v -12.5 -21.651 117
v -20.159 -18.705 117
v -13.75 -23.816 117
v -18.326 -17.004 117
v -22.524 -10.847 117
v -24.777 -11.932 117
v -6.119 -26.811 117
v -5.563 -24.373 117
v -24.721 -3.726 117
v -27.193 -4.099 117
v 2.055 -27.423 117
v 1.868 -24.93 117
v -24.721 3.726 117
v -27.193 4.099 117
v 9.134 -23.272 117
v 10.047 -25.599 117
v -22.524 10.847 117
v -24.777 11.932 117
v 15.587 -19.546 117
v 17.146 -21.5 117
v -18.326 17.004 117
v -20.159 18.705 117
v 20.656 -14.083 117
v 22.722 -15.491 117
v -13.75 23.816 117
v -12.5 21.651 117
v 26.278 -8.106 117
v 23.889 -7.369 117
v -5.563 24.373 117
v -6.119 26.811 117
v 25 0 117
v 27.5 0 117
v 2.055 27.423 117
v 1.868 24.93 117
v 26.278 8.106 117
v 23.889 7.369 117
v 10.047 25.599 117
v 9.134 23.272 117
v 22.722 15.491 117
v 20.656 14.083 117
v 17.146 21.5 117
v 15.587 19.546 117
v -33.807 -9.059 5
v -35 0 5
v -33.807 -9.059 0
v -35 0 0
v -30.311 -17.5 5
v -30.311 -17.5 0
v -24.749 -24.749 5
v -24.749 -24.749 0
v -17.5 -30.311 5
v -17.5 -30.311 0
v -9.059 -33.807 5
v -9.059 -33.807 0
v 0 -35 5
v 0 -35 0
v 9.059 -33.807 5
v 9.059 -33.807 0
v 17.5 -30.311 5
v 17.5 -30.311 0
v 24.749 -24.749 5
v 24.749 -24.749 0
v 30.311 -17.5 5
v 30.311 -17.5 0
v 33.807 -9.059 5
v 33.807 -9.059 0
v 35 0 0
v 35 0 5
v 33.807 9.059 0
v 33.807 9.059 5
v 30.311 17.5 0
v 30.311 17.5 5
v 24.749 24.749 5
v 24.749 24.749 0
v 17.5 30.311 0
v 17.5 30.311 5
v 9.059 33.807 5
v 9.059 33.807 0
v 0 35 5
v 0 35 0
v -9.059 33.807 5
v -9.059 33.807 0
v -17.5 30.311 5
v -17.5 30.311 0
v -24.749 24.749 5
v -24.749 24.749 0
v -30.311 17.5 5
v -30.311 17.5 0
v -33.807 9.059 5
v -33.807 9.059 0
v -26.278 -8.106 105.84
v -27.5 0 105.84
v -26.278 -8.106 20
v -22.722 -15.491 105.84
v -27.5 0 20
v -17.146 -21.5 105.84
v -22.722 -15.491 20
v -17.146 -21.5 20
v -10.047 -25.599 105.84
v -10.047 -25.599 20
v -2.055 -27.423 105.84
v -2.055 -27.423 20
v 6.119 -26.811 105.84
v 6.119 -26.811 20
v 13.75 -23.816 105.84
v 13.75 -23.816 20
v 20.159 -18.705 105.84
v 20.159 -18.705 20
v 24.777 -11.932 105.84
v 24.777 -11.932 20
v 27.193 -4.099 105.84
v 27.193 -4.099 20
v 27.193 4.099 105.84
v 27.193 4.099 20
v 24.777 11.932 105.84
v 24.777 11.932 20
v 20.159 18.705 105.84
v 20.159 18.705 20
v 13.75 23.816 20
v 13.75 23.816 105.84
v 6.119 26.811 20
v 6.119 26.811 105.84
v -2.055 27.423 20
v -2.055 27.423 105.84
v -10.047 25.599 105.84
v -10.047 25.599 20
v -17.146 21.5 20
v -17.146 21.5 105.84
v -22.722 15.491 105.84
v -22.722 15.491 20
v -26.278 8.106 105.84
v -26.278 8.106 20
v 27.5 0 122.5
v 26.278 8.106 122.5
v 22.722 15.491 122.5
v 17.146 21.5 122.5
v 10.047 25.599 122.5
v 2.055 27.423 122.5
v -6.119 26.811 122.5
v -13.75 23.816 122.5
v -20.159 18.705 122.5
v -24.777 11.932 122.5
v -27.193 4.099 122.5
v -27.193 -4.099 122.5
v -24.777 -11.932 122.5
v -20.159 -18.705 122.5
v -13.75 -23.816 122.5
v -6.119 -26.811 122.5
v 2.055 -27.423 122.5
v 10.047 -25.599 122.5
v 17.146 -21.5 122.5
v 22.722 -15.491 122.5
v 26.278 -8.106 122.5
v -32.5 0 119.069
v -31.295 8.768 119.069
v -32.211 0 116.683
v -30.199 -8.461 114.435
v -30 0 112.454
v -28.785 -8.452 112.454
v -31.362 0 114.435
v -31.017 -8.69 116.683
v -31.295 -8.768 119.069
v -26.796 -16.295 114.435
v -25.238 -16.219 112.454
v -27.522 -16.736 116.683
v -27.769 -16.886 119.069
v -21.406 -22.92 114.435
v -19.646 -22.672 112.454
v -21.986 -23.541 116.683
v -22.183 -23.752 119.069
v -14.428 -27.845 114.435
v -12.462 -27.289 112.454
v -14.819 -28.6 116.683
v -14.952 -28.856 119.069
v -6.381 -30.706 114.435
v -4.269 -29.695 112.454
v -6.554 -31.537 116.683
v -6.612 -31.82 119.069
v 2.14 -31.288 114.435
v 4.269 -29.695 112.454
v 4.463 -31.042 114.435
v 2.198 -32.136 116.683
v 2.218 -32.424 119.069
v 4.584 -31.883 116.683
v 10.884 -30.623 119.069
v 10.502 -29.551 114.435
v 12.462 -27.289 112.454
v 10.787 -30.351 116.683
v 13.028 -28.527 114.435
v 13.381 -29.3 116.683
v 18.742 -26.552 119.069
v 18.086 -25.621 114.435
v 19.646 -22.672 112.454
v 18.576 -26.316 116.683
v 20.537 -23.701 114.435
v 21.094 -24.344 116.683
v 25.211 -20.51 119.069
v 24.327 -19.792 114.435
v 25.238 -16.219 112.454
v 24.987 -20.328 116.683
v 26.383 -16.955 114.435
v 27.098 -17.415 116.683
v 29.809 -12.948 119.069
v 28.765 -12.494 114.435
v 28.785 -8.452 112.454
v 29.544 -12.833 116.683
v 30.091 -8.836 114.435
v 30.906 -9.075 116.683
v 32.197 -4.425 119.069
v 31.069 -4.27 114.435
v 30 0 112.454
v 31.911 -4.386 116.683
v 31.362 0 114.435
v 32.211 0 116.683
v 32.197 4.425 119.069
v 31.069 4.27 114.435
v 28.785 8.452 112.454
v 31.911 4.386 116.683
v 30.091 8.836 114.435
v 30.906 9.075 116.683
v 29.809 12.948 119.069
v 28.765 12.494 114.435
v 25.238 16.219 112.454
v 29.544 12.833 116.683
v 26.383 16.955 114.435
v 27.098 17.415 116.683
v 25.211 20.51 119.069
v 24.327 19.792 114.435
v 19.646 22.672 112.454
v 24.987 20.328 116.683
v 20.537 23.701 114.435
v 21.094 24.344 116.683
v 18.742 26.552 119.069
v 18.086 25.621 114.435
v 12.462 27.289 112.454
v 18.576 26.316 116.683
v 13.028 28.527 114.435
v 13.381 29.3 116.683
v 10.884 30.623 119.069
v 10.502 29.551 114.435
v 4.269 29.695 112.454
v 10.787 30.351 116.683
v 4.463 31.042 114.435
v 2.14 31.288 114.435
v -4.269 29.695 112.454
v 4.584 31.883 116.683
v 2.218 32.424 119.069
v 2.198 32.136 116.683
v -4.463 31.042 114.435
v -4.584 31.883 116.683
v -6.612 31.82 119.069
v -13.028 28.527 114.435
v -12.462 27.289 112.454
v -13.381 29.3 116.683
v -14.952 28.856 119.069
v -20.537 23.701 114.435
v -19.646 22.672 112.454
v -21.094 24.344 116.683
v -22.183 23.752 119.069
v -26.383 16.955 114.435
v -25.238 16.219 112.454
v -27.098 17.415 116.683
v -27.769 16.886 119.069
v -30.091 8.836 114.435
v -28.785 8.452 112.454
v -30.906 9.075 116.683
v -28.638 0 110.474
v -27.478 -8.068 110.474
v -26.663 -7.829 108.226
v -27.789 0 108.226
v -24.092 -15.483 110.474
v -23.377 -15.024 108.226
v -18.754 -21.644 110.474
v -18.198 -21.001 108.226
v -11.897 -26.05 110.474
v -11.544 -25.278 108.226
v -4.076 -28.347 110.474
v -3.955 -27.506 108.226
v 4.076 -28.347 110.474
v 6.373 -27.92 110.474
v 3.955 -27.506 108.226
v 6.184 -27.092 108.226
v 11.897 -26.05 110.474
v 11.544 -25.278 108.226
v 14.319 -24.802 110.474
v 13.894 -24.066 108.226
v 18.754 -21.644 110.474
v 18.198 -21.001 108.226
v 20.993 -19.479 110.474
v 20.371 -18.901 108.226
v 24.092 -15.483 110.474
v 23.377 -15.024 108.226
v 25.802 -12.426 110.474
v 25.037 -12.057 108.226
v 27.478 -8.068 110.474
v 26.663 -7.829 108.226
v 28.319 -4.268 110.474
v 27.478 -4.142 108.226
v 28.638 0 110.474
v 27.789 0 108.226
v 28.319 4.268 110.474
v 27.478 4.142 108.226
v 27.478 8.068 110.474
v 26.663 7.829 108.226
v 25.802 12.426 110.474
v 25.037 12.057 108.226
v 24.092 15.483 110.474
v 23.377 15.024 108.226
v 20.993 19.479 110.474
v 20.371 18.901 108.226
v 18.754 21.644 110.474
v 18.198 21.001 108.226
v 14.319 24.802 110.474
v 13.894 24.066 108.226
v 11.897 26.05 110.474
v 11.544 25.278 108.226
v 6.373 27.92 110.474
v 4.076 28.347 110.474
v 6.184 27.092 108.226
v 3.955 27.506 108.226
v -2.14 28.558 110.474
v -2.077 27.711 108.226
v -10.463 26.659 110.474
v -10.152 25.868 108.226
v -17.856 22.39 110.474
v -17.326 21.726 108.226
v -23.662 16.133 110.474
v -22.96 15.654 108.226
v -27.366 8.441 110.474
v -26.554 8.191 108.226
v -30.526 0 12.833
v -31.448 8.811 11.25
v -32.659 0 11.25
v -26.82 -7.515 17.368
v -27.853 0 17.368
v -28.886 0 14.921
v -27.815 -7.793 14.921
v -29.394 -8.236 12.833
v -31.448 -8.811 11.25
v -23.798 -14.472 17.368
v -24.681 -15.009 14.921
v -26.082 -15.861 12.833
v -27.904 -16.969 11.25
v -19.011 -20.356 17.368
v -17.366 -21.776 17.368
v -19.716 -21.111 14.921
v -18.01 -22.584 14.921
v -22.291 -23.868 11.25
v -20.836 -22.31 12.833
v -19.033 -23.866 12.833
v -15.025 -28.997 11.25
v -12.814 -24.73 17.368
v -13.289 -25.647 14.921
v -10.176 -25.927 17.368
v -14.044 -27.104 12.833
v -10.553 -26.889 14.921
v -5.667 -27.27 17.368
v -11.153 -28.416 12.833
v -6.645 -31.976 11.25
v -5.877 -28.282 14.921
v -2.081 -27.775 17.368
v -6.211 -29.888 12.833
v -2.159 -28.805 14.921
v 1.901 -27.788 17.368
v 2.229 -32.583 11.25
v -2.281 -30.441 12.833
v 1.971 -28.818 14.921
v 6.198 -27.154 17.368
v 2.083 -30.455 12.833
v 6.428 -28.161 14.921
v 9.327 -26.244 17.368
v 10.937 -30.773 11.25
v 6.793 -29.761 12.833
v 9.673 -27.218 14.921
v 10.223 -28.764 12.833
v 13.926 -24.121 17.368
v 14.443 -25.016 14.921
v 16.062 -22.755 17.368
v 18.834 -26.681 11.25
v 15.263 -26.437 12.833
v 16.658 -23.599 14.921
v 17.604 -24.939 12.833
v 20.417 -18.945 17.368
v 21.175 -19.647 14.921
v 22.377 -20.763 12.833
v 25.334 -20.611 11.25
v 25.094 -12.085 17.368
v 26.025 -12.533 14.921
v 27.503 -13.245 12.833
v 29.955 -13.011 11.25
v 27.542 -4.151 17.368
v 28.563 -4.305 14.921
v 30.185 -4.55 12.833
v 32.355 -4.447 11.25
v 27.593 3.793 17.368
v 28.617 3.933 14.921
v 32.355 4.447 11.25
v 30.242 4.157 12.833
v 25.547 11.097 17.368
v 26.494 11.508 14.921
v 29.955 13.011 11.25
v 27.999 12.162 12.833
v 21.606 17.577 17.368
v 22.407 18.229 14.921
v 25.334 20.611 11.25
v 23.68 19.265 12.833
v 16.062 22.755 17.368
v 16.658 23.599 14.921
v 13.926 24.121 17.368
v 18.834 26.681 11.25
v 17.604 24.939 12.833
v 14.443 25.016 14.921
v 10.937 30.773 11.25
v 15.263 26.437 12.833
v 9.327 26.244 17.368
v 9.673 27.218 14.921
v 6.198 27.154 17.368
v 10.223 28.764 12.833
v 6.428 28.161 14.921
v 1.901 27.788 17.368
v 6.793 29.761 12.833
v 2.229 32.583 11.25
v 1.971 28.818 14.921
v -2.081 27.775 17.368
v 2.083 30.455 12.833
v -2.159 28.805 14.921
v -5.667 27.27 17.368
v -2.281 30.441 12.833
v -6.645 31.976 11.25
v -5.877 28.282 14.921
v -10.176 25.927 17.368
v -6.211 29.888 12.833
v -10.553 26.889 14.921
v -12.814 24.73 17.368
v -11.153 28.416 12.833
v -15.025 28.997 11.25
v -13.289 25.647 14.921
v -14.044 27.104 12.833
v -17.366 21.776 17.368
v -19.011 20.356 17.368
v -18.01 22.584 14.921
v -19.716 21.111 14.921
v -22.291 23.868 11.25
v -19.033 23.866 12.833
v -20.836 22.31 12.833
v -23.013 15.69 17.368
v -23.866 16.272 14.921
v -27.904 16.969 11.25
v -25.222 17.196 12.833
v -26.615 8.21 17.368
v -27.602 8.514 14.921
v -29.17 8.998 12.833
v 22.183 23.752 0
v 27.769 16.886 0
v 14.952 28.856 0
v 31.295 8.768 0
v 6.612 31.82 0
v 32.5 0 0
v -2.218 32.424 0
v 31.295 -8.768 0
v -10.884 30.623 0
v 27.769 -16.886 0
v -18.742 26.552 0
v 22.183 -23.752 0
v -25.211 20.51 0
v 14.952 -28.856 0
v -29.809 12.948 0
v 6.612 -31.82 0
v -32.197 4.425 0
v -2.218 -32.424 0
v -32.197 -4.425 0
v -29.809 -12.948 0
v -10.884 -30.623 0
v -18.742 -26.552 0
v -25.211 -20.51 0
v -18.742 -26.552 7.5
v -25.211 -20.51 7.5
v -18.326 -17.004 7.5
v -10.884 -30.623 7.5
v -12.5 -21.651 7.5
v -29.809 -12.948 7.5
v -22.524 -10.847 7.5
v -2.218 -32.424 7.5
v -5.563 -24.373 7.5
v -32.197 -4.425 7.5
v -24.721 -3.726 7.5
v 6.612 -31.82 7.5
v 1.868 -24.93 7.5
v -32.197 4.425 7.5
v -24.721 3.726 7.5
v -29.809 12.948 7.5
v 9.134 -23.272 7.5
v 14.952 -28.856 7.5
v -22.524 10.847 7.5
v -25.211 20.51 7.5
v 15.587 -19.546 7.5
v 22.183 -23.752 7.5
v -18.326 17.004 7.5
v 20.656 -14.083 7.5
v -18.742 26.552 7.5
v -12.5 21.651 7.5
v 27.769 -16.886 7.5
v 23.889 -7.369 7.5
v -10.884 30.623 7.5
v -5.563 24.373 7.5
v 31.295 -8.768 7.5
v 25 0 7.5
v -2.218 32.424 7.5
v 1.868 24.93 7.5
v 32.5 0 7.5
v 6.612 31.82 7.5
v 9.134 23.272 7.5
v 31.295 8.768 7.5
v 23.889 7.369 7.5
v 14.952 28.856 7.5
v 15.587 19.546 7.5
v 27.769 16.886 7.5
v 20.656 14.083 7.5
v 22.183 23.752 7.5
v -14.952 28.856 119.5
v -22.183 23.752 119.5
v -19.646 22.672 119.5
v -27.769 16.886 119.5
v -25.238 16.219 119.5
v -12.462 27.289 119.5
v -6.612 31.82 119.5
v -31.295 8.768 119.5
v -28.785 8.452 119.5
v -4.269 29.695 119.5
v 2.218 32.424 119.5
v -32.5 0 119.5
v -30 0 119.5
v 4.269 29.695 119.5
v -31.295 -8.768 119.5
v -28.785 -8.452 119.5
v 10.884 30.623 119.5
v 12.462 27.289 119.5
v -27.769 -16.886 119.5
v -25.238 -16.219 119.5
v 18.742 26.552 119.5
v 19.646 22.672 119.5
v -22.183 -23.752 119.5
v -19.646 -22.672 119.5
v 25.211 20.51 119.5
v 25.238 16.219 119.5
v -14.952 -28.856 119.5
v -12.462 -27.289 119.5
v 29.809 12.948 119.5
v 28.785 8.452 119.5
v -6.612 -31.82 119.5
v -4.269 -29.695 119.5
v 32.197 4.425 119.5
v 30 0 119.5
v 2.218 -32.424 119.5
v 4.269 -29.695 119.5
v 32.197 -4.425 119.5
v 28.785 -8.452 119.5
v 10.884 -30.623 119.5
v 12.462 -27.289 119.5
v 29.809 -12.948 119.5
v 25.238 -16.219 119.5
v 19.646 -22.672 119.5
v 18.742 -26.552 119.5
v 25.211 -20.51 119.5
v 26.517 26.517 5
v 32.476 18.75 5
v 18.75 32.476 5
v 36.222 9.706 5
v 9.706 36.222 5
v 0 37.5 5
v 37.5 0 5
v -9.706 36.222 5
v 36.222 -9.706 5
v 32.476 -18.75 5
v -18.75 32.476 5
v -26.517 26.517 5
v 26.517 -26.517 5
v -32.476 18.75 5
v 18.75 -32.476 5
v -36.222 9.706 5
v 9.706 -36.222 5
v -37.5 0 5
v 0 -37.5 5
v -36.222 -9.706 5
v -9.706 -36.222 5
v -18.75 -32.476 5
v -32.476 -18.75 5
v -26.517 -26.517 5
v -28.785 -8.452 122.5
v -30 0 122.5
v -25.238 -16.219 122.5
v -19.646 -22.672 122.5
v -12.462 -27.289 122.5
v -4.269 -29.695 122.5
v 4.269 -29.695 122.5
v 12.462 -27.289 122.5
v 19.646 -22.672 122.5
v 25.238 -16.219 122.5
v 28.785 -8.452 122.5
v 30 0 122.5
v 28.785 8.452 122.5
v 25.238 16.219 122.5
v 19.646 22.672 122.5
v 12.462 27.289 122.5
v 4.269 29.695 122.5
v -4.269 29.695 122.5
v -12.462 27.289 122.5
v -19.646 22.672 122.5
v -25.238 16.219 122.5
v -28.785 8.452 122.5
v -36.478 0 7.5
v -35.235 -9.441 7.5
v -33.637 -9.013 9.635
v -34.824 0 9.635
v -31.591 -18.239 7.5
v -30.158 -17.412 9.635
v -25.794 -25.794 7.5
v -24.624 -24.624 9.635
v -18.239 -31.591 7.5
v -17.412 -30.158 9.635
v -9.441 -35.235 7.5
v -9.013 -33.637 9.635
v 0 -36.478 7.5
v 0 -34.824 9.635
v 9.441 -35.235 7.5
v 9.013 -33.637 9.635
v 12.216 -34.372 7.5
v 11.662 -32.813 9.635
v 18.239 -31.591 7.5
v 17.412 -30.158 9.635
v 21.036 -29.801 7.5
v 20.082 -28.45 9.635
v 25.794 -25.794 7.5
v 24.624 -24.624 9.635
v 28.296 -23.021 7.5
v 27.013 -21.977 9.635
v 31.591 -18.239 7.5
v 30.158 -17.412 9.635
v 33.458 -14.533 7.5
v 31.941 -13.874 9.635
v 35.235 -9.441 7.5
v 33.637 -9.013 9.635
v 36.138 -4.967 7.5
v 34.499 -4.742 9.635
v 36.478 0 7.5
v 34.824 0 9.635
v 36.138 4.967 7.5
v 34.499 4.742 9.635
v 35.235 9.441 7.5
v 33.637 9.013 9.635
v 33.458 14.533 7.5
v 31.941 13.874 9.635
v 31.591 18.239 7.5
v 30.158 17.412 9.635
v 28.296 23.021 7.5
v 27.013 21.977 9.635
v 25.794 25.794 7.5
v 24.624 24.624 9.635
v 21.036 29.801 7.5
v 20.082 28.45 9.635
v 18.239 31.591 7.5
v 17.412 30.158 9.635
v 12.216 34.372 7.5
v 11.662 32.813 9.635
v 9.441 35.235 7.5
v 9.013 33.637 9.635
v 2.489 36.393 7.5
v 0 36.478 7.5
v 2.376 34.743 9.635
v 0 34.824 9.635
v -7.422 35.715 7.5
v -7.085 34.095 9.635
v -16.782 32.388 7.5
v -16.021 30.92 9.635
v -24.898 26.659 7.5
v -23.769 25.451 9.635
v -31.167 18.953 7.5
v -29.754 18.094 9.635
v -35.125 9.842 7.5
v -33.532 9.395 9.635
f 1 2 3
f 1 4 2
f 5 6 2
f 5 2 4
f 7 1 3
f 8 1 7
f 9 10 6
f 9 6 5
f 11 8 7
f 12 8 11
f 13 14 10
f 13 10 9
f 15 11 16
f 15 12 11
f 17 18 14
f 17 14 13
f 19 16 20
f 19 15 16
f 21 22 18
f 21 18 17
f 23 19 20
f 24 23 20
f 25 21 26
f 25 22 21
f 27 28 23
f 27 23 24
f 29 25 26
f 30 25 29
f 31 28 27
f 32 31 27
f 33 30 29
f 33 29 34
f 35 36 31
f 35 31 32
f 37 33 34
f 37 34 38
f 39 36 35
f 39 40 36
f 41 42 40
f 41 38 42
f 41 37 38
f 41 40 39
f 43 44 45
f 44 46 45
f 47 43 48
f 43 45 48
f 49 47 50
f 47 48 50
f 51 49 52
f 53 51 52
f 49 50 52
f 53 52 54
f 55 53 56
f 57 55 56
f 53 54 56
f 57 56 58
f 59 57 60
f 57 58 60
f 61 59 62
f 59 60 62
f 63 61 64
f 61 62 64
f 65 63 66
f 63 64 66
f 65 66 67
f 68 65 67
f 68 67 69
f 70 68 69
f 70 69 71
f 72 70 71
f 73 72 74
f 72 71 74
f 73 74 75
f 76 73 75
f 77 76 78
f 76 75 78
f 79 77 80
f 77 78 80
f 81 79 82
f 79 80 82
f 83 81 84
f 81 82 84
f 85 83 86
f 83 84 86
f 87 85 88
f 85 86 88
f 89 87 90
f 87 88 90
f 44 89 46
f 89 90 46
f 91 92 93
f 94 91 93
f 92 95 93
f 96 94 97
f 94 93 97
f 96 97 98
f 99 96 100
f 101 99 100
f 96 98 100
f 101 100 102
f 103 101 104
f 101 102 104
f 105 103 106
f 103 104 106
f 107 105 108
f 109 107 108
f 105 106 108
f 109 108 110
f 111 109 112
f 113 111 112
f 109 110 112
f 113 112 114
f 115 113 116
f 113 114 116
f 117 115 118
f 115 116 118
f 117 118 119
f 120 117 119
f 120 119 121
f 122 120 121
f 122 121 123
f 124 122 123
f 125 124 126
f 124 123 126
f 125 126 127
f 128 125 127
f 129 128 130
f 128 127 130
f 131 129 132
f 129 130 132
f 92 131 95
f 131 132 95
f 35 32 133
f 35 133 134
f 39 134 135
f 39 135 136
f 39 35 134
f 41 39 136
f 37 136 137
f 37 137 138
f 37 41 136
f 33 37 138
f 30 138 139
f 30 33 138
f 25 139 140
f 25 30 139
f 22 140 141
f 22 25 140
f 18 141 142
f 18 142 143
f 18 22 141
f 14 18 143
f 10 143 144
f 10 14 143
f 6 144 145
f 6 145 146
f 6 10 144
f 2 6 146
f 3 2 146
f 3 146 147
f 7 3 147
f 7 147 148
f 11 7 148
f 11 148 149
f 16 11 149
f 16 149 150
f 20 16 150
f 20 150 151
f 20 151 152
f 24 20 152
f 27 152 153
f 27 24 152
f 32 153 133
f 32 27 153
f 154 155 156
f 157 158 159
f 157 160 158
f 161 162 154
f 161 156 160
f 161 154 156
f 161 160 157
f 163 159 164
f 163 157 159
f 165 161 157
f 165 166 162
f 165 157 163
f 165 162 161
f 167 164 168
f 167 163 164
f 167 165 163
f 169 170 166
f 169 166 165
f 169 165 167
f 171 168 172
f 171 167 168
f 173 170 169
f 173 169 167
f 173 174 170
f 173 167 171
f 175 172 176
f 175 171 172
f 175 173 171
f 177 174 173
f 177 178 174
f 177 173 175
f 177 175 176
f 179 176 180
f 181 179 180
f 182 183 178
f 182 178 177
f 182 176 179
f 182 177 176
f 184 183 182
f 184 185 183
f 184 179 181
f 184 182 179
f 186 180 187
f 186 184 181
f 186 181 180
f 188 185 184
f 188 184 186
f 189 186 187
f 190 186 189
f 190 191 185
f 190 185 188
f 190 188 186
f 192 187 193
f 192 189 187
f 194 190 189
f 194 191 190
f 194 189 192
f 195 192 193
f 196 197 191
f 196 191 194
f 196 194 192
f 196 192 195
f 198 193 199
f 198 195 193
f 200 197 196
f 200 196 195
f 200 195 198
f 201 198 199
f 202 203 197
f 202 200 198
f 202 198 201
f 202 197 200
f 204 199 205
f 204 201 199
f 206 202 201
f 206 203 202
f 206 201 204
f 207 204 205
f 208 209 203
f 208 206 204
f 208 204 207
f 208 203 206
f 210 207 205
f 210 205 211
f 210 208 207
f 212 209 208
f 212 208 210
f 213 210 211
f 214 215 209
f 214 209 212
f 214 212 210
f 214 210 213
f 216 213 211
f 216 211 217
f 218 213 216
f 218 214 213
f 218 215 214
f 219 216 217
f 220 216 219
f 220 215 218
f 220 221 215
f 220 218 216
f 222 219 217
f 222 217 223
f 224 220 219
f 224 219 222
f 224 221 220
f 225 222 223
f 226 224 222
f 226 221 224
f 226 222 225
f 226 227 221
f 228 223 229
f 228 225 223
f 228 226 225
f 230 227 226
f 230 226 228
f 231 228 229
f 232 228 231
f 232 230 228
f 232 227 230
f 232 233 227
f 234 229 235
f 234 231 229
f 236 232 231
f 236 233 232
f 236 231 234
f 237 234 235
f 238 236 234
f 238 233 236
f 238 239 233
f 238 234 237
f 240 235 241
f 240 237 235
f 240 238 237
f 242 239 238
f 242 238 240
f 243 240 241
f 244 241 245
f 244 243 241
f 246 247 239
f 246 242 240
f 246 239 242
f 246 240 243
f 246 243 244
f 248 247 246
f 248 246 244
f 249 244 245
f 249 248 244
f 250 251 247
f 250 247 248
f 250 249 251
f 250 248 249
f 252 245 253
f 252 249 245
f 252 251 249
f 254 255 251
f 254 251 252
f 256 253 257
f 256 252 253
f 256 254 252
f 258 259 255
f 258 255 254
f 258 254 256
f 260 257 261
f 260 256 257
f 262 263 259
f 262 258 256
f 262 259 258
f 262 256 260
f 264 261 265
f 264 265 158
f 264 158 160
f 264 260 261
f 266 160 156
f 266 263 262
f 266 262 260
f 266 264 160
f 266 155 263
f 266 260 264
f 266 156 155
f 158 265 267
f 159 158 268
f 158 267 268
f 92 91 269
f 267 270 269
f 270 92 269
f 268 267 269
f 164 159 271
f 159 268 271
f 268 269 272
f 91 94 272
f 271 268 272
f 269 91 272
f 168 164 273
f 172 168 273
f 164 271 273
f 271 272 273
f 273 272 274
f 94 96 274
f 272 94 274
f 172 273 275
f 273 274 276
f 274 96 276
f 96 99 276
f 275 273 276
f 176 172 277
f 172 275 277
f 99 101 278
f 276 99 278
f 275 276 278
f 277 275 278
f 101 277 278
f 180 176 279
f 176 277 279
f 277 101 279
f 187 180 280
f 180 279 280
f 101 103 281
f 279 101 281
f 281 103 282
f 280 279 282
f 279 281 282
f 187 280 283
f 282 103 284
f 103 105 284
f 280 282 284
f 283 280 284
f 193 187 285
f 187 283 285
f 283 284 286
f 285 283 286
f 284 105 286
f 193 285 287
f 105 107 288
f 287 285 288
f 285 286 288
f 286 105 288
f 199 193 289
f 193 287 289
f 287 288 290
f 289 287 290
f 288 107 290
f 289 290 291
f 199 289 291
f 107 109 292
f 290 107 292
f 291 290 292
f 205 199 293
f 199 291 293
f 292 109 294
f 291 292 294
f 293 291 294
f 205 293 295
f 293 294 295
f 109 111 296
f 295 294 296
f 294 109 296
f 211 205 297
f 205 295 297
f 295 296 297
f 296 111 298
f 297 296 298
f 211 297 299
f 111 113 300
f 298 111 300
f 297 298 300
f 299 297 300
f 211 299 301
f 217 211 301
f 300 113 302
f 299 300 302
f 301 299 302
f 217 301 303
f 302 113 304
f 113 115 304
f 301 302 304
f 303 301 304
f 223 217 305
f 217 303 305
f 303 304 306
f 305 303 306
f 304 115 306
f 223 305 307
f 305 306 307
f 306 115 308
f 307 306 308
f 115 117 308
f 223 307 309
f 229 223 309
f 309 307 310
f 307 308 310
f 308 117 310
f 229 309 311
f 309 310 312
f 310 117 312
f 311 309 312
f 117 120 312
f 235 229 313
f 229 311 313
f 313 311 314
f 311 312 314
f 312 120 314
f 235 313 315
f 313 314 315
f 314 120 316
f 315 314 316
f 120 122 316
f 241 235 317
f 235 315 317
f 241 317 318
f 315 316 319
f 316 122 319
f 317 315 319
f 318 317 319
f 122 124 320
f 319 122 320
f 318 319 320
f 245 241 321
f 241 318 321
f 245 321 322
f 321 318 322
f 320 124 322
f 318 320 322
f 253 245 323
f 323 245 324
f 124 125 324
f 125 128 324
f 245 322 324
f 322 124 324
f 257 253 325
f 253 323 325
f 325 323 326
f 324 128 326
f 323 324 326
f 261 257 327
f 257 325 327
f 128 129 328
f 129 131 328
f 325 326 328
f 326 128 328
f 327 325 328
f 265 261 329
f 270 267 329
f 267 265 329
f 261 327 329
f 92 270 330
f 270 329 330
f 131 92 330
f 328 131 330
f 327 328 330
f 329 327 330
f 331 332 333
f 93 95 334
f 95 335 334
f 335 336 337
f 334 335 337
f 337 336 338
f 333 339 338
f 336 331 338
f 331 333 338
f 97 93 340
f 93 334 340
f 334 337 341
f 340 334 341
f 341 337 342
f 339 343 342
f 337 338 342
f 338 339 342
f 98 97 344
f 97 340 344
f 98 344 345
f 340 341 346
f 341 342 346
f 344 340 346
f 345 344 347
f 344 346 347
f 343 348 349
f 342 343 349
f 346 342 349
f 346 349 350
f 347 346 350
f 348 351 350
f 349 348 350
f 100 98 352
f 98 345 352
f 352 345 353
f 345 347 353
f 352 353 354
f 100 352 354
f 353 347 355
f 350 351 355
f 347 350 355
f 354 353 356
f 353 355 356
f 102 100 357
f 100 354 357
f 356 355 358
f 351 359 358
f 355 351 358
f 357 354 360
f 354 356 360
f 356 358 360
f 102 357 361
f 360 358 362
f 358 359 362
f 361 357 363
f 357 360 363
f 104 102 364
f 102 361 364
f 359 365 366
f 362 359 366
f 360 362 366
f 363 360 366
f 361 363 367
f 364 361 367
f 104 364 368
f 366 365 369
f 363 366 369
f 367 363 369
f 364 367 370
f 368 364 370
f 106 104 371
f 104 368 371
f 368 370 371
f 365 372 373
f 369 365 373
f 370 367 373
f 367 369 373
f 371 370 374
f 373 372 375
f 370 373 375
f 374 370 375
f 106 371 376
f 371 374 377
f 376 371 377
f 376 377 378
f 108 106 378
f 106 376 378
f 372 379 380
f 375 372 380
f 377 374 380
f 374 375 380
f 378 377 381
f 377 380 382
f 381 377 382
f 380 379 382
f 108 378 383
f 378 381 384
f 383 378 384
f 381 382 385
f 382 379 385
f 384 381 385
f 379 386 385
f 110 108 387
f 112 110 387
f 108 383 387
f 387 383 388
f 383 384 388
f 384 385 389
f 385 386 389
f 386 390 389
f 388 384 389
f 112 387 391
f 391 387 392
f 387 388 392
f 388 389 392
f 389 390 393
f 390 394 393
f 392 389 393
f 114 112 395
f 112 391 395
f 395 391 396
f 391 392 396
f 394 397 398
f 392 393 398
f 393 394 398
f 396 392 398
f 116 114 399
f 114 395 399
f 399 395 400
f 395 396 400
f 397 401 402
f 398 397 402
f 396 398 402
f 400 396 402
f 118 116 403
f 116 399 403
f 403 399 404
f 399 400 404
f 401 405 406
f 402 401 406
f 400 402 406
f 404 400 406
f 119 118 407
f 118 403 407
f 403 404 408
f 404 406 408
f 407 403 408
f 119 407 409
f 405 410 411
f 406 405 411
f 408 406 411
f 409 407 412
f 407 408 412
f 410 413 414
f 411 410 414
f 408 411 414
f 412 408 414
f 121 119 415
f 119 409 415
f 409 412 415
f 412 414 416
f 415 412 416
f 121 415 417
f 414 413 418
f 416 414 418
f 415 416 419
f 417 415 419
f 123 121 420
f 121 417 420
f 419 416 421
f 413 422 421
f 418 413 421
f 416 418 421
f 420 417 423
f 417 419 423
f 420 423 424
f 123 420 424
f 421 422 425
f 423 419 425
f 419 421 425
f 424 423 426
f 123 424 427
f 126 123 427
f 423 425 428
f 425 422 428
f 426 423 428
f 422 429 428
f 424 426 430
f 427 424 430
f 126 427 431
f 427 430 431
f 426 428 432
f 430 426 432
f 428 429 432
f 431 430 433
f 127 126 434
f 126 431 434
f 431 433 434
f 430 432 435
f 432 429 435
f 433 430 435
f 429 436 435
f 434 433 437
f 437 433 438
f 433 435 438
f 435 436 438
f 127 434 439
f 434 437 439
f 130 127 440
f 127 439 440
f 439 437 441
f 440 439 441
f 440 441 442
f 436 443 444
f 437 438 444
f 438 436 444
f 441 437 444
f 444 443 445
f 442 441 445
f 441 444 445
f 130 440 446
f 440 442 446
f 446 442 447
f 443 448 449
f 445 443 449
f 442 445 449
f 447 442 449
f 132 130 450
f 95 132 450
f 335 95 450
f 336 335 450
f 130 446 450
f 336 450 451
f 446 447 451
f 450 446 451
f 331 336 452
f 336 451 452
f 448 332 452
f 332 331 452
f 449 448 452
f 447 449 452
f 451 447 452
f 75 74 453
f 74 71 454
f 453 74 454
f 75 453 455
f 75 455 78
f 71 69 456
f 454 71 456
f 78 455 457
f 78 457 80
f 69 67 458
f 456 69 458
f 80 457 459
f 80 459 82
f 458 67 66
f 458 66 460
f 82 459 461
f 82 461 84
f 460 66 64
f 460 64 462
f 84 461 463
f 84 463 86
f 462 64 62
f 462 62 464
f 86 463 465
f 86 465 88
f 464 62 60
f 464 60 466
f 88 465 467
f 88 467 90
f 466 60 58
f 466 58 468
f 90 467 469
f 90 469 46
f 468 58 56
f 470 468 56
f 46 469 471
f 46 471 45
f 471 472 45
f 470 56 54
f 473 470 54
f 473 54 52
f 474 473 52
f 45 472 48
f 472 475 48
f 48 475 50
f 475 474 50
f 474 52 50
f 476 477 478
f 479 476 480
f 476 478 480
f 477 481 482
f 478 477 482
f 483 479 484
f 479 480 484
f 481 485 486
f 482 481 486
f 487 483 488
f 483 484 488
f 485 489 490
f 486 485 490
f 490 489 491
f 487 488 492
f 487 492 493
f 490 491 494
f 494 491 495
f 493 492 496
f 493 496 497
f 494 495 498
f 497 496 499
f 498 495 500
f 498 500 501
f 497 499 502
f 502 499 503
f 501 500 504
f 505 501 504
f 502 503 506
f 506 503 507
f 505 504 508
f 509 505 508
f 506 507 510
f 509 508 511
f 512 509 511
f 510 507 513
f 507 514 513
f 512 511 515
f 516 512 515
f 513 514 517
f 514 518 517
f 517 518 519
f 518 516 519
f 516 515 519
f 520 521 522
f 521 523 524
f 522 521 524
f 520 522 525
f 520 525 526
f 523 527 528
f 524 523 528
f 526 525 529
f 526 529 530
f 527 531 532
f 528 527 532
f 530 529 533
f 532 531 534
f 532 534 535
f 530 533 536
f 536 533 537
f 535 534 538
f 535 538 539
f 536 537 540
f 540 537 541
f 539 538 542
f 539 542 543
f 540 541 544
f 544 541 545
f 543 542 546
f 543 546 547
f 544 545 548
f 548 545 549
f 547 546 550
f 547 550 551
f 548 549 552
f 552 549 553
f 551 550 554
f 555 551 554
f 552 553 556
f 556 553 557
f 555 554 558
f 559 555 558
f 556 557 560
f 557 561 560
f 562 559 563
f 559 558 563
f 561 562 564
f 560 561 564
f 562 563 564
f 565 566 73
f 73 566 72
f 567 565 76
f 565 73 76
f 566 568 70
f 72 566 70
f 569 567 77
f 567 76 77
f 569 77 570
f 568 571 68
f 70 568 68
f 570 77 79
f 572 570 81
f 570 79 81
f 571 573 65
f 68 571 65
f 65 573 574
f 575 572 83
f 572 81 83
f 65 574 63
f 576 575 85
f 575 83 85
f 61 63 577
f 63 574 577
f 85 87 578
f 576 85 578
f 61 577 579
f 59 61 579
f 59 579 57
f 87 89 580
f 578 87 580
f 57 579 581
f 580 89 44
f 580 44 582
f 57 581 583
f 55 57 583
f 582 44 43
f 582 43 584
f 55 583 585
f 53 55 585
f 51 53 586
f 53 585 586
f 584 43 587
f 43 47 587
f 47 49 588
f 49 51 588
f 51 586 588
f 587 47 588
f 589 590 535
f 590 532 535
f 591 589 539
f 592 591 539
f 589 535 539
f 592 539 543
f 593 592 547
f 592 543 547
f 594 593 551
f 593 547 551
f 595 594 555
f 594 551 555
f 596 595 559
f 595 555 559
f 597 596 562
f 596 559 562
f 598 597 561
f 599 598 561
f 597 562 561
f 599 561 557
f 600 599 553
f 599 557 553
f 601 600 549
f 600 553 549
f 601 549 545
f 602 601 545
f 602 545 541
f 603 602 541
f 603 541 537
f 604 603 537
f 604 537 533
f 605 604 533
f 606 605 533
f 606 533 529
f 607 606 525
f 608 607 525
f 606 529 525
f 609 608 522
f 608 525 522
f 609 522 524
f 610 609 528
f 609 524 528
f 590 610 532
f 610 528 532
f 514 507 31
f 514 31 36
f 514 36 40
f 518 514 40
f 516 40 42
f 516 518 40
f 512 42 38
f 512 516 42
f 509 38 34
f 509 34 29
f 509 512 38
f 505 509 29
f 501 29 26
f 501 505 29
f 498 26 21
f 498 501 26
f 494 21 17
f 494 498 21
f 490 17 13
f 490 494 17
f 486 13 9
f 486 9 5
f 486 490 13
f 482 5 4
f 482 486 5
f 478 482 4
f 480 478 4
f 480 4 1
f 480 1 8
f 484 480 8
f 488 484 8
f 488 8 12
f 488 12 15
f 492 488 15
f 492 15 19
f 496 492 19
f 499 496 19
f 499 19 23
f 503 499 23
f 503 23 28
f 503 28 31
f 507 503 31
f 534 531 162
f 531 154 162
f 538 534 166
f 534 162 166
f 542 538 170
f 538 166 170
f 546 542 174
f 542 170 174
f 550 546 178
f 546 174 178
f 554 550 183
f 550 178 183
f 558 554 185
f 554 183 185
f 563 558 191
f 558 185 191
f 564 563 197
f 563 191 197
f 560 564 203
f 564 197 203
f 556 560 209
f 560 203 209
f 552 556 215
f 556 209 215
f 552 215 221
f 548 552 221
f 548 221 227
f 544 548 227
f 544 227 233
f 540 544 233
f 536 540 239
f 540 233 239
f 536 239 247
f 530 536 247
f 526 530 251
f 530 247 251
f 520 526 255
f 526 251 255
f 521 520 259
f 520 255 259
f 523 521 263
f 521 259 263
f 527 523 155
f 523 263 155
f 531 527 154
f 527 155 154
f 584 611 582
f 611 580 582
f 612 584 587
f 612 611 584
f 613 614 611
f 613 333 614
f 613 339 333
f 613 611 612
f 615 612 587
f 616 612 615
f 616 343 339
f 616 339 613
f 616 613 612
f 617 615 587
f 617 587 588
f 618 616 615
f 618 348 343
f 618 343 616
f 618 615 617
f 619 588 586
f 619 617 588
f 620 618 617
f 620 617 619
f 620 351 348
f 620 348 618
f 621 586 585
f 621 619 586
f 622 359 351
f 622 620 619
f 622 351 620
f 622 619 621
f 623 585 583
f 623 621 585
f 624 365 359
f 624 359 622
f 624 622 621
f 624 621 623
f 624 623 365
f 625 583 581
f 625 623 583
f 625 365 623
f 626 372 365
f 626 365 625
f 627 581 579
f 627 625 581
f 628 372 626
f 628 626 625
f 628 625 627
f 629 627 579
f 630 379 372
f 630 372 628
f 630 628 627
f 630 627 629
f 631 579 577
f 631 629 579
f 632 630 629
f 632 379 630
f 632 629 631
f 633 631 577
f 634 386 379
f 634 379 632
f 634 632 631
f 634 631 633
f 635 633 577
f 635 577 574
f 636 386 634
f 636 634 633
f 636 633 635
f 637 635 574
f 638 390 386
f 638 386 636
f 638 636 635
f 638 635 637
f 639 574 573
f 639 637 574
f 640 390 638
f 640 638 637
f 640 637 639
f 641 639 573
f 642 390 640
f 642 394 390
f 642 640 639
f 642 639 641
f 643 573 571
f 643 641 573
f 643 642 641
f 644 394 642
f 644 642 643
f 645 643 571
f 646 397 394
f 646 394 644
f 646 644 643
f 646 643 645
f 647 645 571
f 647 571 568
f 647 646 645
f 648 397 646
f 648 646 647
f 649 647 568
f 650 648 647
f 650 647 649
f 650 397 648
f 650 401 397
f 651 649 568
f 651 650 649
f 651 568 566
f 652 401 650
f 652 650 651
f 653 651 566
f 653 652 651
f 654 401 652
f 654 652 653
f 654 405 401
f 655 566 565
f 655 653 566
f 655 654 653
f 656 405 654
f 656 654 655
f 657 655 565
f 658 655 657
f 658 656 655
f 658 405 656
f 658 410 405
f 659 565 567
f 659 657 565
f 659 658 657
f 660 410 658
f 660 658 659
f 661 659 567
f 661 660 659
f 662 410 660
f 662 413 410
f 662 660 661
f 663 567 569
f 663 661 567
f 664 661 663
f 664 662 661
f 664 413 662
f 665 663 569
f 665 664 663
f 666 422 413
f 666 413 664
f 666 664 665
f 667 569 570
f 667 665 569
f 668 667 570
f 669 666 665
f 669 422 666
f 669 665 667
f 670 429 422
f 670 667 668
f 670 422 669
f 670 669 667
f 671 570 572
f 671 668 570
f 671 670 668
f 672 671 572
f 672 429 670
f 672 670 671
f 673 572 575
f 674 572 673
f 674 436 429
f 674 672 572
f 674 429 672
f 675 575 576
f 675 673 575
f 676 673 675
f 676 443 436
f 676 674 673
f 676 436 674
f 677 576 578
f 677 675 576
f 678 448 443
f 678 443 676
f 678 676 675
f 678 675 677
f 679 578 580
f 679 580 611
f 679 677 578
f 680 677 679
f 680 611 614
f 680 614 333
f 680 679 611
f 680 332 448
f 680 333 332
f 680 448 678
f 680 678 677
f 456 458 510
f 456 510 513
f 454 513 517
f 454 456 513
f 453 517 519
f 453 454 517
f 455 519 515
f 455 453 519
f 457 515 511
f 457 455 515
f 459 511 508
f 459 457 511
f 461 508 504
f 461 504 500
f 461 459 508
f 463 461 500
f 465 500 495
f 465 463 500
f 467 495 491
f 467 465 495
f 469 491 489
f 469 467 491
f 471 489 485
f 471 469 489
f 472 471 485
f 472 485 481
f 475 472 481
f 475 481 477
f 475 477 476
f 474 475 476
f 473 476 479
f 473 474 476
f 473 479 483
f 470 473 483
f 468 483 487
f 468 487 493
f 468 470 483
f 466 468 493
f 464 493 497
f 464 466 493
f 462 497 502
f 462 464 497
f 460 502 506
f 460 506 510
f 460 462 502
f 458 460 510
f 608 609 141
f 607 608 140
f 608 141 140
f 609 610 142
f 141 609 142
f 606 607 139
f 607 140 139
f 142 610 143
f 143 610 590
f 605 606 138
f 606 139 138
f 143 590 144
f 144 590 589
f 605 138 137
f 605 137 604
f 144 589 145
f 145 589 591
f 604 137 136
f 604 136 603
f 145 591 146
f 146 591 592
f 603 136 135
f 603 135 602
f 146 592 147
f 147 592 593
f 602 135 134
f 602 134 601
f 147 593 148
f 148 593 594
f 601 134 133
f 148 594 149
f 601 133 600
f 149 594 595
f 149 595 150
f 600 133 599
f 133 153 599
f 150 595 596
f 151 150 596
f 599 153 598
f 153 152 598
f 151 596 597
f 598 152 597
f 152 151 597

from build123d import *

# Parameters (mm, degrees)
SHELL1_OUTLINE_R     = 25
SHELL1_DEPTH         = 122.5
SHELL1_2_OUTLINE_R   = 32.5
SHELL1_2_OUTLINE_R_2 = 25
SHELL1_2_DEPTH       = 7.5
SHELL1_START         = 117
SHELL1_3_OUTLINE_R   = 27.5
SHELL1_3_OUTLINE_R_2 = 25
SHELL1_3_DEPTH       = 5.5
FILLET1_R            = 10
FILLET2_R            = 10


# Read off the part's stored shape, not the designer's step: Shell1
with BuildPart() as part:
    # Sketch1 → Revolve1 (revolve)
    with BuildSketch(Plane(origin=(0, 0, 0), x_dir=(1, 0, 0), z_dir=(0, 1, 0)), mode=Mode.PRIVATE) as revolve1_sk:
        Polygon((0, 0), (0, -122.5), (30, -122.5), (30, -119.5), (32.5, -119.5), (32.5, -114.5), (27.5, -114.5), (27.5, -10), (37.5, -10), (37.5, -5), (35, -5), (35, 0), align=None)
    revolve(revolve1_sk.sketch.rotate(Axis((0, 0, 0), (0, 0, 1)), 180), axis=Axis((0, 0, 0), (0, 0, 1)))

    # Shell1 outline → Shell1 (cut)
    with BuildSketch(Plane.XY):
        Circle(SHELL1_OUTLINE_R)
    extrude(amount=SHELL1_DEPTH, mode=Mode.SUBTRACT)

    # Shell1 2 outline → Shell1 2 (cut)
    with BuildSketch(Plane.XY):
        Circle(SHELL1_2_OUTLINE_R)
        Circle(SHELL1_2_OUTLINE_R_2, mode=Mode.SUBTRACT)
    extrude(amount=SHELL1_2_DEPTH, mode=Mode.SUBTRACT)

    # Shell1 3 outline → Shell1 3 (cut)
    with BuildSketch(Plane.XY.offset(SHELL1_START)):
        Circle(SHELL1_3_OUTLINE_R)
        Circle(SHELL1_3_OUTLINE_R_2, mode=Mode.SUBTRACT)
    extrude(amount=SHELL1_3_DEPTH, mode=Mode.SUBTRACT)

    # Fillet1
    # the kernel refuses this fillet: 10 mm, written as the material it adds along each edge
    with BuildSketch(Plane(origin=(0, 0, 10), x_dir=(-1, 0, 0), z_dir=(0, 1, 0))) as fillet1_piece_1:
        with BuildLine():
            CenterArc((27.5 + FILLET1_R, FILLET1_R), FILLET1_R, 180, 90)
            Line((27.5 + FILLET1_R, 0), (27.5 + FILLET1_R, -FILLET1_R * 0.02))
            Line((27.5 + FILLET1_R, -FILLET1_R * 0.02), (27.5 - FILLET1_R * 0.02, -FILLET1_R * 0.02))
            Line((27.5 - FILLET1_R * 0.02, -FILLET1_R * 0.02), (27.5 - FILLET1_R * 0.02, FILLET1_R))
            Line((27.5 - FILLET1_R * 0.02, FILLET1_R), (27.5, FILLET1_R))
        make_face()
    revolve(axis=Axis((0, 0, 10), (0, 0, 1)))
    with BuildSketch(Plane(origin=(0, 0, 114.5), x_dir=(-1, 0, 0), z_dir=(0, 1, 0))) as fillet1_piece_2:
        with BuildLine():
            CenterArc((37.5, -8.660254038), FILLET1_R, 120, 60)
            Line((27.5, -8.660254038), (27.3, -8.660254038))
            Line((27.3, -8.660254038), (27.3, 0))
            Line((27.3, 0), (27.5, 0.2))
            ThreePointArc((27.5, 0.2), (30, 0.2), (32.4, 0.173205081))
            Line((32.4, 0.173205081), (32.5, 0))
        make_face()
    revolve(axis=Axis((0, 0, 114.5), (0, 0, 1)))

    # Fillet2
    # the kernel refuses this fillet: 10 mm, written as the material it takes off along each edge
    with BuildSketch(Plane(origin=(0, 0, 10), x_dir=(-1, 0, 0), z_dir=(0, 1, 0))) as fillet2_piece_1:
        with BuildLine():
            CenterArc((27.817541634, -7.5), FILLET2_R, 14.477512186, 46.567463442)
            Line((37.5, -5), (37.693649167, -4.95))
            ThreePointArc((37.693649167, -4.95), (37.7, -2.5), (37.7, 0))
            Line((37.7, 0), (37.5, 0.2))
            ThreePointArc((37.5, 0.2), (35.05, 0.511190802), (32.755595401, 1.425))
            Line((32.755595401, 1.425), (32.658770817, 1.25))
        make_face()
    revolve(axis=Axis((0, 0, 10), (0, 0, 1)), mode=Mode.SUBTRACT)
    with BuildSketch(Plane(origin=(0, 0, 114.5), x_dir=(-1, 0, 0), z_dir=(0, 1, 0))) as fillet2_piece_2:
        with BuildLine():
            CenterArc((22.5, 4.568502517), FILLET2_R, 318.590377891, 41.409622109)
            Line((32.5, 4.568502517), (32.7, 4.568502517))
            Line((32.7, 4.568502517), (32.7, 0))
            Line((32.7, 0), (32.6, -0.173205081))
            ThreePointArc((32.6, -0.173205081), (31.293504258, -1.076098804), (30.15, -2.178163326))
            Line((30.15, -2.178163326), (30, -2.04587576))
        make_face()
    revolve(axis=Axis((0, 0, 114.5), (0, 0, 1)), mode=Mode.SUBTRACT)


solid = part.part
